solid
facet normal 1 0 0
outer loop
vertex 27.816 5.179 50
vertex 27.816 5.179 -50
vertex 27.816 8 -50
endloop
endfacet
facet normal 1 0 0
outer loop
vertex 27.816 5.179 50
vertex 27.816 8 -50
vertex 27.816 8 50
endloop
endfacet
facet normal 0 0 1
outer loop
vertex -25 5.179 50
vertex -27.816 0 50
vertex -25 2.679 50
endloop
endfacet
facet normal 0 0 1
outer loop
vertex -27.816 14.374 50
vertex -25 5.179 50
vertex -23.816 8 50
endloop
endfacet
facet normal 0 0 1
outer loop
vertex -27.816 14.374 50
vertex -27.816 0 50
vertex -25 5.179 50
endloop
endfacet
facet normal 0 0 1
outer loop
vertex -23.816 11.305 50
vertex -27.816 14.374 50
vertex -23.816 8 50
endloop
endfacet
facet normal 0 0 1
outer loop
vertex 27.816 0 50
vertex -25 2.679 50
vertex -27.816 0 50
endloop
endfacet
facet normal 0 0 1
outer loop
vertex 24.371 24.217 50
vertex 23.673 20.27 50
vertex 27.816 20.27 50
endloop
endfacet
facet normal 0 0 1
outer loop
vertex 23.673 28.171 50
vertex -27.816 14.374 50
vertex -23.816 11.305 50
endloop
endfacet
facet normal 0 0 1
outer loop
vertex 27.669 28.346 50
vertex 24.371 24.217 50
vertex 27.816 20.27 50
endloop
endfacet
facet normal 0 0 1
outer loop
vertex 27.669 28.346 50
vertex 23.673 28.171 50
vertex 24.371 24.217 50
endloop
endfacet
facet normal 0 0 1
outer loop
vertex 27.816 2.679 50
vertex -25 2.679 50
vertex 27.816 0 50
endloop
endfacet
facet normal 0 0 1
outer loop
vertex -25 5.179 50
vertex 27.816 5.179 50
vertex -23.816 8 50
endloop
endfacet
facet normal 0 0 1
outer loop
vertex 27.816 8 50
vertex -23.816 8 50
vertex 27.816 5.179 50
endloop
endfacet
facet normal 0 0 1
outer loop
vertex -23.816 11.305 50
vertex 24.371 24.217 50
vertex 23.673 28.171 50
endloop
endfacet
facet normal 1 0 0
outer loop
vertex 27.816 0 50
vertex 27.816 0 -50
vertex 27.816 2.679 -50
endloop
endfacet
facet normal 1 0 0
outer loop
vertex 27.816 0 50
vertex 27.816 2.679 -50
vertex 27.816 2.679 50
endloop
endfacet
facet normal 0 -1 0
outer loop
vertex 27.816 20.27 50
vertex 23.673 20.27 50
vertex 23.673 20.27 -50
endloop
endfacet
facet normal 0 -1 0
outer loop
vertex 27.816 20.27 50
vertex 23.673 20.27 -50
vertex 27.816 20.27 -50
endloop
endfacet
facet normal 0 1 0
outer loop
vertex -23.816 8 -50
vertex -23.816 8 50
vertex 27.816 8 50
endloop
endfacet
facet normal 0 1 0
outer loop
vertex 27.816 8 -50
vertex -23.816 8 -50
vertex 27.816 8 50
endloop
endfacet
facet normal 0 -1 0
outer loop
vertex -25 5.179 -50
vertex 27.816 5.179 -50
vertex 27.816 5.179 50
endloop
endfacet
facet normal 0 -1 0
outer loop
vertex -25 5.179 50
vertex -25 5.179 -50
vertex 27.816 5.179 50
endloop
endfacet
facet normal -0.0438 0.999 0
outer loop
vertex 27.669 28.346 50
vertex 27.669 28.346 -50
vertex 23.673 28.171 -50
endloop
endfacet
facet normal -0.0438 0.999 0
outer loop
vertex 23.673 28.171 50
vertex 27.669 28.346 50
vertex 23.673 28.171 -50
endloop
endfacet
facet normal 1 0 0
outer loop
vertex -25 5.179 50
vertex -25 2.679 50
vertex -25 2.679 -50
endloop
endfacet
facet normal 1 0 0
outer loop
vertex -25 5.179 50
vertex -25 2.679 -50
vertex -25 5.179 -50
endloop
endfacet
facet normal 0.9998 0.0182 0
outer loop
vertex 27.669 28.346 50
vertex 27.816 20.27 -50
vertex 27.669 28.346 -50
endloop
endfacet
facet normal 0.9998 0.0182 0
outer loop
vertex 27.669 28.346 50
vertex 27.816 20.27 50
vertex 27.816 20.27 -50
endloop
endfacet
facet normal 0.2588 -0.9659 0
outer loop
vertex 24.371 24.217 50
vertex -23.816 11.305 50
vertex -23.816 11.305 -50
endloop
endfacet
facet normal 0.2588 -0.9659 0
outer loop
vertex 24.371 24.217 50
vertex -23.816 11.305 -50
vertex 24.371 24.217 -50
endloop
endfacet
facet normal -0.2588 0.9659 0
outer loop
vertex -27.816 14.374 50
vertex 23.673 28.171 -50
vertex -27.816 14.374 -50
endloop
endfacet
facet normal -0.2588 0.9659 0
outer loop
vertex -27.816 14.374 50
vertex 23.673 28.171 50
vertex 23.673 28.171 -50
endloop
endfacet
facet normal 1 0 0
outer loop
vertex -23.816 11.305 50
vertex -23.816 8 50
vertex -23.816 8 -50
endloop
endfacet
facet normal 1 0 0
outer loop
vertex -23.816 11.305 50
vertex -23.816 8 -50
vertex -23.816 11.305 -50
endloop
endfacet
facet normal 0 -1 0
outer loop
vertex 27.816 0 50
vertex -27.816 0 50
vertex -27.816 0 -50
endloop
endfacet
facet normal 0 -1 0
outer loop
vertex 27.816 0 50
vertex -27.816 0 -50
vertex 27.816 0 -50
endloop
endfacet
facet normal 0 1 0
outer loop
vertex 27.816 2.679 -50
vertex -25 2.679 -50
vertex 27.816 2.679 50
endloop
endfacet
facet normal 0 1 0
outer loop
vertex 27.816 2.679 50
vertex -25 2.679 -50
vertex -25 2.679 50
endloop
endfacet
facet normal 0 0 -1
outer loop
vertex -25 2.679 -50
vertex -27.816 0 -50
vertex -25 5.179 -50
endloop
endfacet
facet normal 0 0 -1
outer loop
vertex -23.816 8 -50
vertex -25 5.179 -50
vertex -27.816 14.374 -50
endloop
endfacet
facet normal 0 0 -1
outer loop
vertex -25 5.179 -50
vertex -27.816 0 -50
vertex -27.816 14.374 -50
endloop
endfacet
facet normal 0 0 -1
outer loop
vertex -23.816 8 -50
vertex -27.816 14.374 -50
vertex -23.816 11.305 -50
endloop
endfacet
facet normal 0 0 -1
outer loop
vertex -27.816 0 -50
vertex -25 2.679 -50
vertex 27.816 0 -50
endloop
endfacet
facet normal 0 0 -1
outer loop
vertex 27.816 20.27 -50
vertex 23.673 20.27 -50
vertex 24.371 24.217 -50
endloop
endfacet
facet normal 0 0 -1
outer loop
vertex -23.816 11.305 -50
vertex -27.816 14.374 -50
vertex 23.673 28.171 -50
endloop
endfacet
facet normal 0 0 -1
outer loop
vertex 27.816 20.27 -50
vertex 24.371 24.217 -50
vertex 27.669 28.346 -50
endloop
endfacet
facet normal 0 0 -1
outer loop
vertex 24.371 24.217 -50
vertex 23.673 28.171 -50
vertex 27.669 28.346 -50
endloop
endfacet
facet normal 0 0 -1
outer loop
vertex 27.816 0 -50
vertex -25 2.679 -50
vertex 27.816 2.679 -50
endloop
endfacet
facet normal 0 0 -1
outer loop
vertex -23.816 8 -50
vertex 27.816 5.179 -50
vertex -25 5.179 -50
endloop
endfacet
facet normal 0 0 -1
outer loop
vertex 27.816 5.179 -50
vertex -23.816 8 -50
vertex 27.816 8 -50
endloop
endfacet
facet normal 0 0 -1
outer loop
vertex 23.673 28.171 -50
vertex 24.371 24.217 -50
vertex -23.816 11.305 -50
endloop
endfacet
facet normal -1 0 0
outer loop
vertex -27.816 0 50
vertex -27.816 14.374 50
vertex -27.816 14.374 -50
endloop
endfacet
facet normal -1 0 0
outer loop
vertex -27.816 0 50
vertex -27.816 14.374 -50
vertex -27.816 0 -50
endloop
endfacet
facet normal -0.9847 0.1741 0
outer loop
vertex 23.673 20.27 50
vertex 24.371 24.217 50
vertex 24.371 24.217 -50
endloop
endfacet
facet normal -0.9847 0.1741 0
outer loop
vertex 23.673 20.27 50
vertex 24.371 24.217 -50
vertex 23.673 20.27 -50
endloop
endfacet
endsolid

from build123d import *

# Parameters (mm, degrees)
F0_W          = 55.6310900272
F0_H          = 100
F1_DEPTH      = 8
F2_W          = 2.5
F2_H          = 158.0840436167
F3_DEPTH      = 27.8165450136
F3_DEPTH_BACK = 25
F5_DEPTH      = 50


# Not quite as in the source:
# - a feature names something its author has since deleted; it is built from what else it names


with BuildPart() as f1:
    # F0 (on Front) → F1 (new body)
    with BuildSketch(Plane.XZ):
        Rectangle(F0_W, F0_H)
    extrude(amount=-F1_DEPTH)

    # F2 (on Right) → F3 (cut, two sides)
    with BuildSketch(Plane.YZ) as f3_sk:
        with Locations((3.9288233686, 7.7119854566)):
            Rectangle(F2_W, F2_H)
    extrude(amount=F3_DEPTH, mode=Mode.SUBTRACT)
    extrude(f3_sk.sketch, amount=-F3_DEPTH_BACK, mode=Mode.SUBTRACT)

    # F4 (on Top) → F5 (join, symmetric)
    with BuildSketch(Plane.XY):
        Polygon((23.6732276815, 28.1708468052), (-27.8155450136, 14.3744717422), (-27.8155450136, 8), (-23.8155450136, 8), (-23.8155450136, 11.3051637903), (24.3706528022, 24.2166165814), (23.6732276815, 20.2701286405), (27.8155450136, 20.2701286405), (27.6694063807, 28.3456489901), align=None)
    extrude(amount=F5_DEPTH, both=True)


solid = f1.part
